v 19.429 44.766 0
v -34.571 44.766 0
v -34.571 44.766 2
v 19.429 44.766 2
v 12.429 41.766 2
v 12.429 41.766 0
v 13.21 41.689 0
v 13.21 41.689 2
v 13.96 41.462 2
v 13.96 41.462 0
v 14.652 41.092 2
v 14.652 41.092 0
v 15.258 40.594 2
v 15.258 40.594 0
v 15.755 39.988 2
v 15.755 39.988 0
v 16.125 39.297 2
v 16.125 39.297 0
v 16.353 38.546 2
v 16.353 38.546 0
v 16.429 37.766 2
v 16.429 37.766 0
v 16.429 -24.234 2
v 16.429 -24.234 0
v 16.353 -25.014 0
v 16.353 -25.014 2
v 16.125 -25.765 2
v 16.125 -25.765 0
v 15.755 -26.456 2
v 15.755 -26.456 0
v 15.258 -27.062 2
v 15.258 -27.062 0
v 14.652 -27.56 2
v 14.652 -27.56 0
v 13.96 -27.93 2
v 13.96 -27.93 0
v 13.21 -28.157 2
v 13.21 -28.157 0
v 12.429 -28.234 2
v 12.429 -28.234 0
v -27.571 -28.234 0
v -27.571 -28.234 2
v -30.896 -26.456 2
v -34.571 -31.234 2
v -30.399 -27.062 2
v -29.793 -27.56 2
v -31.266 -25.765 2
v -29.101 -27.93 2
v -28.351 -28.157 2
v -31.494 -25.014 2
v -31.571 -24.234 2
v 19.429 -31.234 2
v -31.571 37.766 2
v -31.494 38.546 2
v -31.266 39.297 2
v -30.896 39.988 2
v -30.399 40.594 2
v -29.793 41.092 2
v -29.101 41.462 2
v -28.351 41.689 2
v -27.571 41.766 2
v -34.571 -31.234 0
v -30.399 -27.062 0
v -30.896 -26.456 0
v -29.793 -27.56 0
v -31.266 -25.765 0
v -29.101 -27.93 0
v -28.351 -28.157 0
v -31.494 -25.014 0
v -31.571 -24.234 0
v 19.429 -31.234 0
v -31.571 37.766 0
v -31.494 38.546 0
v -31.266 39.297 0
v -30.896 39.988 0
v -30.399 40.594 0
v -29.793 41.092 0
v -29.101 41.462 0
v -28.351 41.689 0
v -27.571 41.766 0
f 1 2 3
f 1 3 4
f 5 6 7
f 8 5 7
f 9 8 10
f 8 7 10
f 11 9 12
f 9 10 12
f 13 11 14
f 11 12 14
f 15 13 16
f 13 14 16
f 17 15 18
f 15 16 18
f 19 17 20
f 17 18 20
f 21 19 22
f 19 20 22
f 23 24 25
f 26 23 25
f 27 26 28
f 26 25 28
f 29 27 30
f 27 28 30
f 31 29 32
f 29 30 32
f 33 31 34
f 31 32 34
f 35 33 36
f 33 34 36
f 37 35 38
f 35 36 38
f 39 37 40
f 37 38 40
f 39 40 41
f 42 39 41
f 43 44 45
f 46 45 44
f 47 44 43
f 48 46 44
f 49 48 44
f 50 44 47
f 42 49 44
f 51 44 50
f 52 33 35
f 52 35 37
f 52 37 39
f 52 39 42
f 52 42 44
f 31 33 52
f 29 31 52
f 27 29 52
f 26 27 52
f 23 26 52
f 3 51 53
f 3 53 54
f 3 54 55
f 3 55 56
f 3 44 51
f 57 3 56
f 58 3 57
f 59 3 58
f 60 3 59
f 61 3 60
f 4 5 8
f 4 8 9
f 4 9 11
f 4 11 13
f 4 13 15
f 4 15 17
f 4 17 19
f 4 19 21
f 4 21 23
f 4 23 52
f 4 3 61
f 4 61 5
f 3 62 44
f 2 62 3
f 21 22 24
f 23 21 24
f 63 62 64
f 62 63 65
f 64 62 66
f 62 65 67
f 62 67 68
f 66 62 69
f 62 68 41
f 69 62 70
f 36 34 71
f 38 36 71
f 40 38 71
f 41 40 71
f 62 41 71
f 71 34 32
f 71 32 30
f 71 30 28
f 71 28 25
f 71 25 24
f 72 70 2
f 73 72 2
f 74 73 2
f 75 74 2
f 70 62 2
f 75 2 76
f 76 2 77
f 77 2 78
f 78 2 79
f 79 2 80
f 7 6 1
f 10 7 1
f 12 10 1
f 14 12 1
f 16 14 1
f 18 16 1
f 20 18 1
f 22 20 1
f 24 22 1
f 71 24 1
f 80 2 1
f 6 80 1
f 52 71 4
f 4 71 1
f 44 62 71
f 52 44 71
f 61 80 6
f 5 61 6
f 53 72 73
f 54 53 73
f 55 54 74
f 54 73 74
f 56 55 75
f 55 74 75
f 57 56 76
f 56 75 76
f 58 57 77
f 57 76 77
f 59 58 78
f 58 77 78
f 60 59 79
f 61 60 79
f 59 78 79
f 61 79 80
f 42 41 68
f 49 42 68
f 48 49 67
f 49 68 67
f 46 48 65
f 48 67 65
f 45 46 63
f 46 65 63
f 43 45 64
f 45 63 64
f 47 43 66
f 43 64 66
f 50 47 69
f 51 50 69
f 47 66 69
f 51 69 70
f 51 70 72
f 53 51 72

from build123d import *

# Parameters (mm, degrees)
F0_W     = 54
F0_H     = 76
F1_DEPTH = 2


with BuildPart() as f1:
    # F0 (on Top) → F1 (new body)
    with BuildSketch(Plane.XY):
        with Locations((-7.570542, 6.766017)):
            Rectangle(F0_W, F0_H)
        with BuildLine():
            ThreePointArc((-31.570542, 37.766017), (-30.398969, 40.594444), (-27.570542, 41.766017))
            Line((-27.570542, 41.766017), (12.429458, 41.766017))
            ThreePointArc((12.429458, 41.766017), (15.257886, 40.594444), (16.429458, 37.766017))
            Line((16.429458, 37.766017), (16.429458, -24.233983))
            ThreePointArc((16.429458, -24.233983), (15.257886, -27.062411), (12.429458, -28.233983))
            Line((12.429458, -28.233983), (-27.570542, -28.233983))
            ThreePointArc((-27.570542, -28.233983), (-30.398969, -27.062411), (-31.570542, -24.233983))
            Line((-31.570542, -24.233983), (-31.570542, 37.766017))
        make_face(mode=Mode.SUBTRACT)
    extrude(amount=F1_DEPTH)


solid = f1.part
